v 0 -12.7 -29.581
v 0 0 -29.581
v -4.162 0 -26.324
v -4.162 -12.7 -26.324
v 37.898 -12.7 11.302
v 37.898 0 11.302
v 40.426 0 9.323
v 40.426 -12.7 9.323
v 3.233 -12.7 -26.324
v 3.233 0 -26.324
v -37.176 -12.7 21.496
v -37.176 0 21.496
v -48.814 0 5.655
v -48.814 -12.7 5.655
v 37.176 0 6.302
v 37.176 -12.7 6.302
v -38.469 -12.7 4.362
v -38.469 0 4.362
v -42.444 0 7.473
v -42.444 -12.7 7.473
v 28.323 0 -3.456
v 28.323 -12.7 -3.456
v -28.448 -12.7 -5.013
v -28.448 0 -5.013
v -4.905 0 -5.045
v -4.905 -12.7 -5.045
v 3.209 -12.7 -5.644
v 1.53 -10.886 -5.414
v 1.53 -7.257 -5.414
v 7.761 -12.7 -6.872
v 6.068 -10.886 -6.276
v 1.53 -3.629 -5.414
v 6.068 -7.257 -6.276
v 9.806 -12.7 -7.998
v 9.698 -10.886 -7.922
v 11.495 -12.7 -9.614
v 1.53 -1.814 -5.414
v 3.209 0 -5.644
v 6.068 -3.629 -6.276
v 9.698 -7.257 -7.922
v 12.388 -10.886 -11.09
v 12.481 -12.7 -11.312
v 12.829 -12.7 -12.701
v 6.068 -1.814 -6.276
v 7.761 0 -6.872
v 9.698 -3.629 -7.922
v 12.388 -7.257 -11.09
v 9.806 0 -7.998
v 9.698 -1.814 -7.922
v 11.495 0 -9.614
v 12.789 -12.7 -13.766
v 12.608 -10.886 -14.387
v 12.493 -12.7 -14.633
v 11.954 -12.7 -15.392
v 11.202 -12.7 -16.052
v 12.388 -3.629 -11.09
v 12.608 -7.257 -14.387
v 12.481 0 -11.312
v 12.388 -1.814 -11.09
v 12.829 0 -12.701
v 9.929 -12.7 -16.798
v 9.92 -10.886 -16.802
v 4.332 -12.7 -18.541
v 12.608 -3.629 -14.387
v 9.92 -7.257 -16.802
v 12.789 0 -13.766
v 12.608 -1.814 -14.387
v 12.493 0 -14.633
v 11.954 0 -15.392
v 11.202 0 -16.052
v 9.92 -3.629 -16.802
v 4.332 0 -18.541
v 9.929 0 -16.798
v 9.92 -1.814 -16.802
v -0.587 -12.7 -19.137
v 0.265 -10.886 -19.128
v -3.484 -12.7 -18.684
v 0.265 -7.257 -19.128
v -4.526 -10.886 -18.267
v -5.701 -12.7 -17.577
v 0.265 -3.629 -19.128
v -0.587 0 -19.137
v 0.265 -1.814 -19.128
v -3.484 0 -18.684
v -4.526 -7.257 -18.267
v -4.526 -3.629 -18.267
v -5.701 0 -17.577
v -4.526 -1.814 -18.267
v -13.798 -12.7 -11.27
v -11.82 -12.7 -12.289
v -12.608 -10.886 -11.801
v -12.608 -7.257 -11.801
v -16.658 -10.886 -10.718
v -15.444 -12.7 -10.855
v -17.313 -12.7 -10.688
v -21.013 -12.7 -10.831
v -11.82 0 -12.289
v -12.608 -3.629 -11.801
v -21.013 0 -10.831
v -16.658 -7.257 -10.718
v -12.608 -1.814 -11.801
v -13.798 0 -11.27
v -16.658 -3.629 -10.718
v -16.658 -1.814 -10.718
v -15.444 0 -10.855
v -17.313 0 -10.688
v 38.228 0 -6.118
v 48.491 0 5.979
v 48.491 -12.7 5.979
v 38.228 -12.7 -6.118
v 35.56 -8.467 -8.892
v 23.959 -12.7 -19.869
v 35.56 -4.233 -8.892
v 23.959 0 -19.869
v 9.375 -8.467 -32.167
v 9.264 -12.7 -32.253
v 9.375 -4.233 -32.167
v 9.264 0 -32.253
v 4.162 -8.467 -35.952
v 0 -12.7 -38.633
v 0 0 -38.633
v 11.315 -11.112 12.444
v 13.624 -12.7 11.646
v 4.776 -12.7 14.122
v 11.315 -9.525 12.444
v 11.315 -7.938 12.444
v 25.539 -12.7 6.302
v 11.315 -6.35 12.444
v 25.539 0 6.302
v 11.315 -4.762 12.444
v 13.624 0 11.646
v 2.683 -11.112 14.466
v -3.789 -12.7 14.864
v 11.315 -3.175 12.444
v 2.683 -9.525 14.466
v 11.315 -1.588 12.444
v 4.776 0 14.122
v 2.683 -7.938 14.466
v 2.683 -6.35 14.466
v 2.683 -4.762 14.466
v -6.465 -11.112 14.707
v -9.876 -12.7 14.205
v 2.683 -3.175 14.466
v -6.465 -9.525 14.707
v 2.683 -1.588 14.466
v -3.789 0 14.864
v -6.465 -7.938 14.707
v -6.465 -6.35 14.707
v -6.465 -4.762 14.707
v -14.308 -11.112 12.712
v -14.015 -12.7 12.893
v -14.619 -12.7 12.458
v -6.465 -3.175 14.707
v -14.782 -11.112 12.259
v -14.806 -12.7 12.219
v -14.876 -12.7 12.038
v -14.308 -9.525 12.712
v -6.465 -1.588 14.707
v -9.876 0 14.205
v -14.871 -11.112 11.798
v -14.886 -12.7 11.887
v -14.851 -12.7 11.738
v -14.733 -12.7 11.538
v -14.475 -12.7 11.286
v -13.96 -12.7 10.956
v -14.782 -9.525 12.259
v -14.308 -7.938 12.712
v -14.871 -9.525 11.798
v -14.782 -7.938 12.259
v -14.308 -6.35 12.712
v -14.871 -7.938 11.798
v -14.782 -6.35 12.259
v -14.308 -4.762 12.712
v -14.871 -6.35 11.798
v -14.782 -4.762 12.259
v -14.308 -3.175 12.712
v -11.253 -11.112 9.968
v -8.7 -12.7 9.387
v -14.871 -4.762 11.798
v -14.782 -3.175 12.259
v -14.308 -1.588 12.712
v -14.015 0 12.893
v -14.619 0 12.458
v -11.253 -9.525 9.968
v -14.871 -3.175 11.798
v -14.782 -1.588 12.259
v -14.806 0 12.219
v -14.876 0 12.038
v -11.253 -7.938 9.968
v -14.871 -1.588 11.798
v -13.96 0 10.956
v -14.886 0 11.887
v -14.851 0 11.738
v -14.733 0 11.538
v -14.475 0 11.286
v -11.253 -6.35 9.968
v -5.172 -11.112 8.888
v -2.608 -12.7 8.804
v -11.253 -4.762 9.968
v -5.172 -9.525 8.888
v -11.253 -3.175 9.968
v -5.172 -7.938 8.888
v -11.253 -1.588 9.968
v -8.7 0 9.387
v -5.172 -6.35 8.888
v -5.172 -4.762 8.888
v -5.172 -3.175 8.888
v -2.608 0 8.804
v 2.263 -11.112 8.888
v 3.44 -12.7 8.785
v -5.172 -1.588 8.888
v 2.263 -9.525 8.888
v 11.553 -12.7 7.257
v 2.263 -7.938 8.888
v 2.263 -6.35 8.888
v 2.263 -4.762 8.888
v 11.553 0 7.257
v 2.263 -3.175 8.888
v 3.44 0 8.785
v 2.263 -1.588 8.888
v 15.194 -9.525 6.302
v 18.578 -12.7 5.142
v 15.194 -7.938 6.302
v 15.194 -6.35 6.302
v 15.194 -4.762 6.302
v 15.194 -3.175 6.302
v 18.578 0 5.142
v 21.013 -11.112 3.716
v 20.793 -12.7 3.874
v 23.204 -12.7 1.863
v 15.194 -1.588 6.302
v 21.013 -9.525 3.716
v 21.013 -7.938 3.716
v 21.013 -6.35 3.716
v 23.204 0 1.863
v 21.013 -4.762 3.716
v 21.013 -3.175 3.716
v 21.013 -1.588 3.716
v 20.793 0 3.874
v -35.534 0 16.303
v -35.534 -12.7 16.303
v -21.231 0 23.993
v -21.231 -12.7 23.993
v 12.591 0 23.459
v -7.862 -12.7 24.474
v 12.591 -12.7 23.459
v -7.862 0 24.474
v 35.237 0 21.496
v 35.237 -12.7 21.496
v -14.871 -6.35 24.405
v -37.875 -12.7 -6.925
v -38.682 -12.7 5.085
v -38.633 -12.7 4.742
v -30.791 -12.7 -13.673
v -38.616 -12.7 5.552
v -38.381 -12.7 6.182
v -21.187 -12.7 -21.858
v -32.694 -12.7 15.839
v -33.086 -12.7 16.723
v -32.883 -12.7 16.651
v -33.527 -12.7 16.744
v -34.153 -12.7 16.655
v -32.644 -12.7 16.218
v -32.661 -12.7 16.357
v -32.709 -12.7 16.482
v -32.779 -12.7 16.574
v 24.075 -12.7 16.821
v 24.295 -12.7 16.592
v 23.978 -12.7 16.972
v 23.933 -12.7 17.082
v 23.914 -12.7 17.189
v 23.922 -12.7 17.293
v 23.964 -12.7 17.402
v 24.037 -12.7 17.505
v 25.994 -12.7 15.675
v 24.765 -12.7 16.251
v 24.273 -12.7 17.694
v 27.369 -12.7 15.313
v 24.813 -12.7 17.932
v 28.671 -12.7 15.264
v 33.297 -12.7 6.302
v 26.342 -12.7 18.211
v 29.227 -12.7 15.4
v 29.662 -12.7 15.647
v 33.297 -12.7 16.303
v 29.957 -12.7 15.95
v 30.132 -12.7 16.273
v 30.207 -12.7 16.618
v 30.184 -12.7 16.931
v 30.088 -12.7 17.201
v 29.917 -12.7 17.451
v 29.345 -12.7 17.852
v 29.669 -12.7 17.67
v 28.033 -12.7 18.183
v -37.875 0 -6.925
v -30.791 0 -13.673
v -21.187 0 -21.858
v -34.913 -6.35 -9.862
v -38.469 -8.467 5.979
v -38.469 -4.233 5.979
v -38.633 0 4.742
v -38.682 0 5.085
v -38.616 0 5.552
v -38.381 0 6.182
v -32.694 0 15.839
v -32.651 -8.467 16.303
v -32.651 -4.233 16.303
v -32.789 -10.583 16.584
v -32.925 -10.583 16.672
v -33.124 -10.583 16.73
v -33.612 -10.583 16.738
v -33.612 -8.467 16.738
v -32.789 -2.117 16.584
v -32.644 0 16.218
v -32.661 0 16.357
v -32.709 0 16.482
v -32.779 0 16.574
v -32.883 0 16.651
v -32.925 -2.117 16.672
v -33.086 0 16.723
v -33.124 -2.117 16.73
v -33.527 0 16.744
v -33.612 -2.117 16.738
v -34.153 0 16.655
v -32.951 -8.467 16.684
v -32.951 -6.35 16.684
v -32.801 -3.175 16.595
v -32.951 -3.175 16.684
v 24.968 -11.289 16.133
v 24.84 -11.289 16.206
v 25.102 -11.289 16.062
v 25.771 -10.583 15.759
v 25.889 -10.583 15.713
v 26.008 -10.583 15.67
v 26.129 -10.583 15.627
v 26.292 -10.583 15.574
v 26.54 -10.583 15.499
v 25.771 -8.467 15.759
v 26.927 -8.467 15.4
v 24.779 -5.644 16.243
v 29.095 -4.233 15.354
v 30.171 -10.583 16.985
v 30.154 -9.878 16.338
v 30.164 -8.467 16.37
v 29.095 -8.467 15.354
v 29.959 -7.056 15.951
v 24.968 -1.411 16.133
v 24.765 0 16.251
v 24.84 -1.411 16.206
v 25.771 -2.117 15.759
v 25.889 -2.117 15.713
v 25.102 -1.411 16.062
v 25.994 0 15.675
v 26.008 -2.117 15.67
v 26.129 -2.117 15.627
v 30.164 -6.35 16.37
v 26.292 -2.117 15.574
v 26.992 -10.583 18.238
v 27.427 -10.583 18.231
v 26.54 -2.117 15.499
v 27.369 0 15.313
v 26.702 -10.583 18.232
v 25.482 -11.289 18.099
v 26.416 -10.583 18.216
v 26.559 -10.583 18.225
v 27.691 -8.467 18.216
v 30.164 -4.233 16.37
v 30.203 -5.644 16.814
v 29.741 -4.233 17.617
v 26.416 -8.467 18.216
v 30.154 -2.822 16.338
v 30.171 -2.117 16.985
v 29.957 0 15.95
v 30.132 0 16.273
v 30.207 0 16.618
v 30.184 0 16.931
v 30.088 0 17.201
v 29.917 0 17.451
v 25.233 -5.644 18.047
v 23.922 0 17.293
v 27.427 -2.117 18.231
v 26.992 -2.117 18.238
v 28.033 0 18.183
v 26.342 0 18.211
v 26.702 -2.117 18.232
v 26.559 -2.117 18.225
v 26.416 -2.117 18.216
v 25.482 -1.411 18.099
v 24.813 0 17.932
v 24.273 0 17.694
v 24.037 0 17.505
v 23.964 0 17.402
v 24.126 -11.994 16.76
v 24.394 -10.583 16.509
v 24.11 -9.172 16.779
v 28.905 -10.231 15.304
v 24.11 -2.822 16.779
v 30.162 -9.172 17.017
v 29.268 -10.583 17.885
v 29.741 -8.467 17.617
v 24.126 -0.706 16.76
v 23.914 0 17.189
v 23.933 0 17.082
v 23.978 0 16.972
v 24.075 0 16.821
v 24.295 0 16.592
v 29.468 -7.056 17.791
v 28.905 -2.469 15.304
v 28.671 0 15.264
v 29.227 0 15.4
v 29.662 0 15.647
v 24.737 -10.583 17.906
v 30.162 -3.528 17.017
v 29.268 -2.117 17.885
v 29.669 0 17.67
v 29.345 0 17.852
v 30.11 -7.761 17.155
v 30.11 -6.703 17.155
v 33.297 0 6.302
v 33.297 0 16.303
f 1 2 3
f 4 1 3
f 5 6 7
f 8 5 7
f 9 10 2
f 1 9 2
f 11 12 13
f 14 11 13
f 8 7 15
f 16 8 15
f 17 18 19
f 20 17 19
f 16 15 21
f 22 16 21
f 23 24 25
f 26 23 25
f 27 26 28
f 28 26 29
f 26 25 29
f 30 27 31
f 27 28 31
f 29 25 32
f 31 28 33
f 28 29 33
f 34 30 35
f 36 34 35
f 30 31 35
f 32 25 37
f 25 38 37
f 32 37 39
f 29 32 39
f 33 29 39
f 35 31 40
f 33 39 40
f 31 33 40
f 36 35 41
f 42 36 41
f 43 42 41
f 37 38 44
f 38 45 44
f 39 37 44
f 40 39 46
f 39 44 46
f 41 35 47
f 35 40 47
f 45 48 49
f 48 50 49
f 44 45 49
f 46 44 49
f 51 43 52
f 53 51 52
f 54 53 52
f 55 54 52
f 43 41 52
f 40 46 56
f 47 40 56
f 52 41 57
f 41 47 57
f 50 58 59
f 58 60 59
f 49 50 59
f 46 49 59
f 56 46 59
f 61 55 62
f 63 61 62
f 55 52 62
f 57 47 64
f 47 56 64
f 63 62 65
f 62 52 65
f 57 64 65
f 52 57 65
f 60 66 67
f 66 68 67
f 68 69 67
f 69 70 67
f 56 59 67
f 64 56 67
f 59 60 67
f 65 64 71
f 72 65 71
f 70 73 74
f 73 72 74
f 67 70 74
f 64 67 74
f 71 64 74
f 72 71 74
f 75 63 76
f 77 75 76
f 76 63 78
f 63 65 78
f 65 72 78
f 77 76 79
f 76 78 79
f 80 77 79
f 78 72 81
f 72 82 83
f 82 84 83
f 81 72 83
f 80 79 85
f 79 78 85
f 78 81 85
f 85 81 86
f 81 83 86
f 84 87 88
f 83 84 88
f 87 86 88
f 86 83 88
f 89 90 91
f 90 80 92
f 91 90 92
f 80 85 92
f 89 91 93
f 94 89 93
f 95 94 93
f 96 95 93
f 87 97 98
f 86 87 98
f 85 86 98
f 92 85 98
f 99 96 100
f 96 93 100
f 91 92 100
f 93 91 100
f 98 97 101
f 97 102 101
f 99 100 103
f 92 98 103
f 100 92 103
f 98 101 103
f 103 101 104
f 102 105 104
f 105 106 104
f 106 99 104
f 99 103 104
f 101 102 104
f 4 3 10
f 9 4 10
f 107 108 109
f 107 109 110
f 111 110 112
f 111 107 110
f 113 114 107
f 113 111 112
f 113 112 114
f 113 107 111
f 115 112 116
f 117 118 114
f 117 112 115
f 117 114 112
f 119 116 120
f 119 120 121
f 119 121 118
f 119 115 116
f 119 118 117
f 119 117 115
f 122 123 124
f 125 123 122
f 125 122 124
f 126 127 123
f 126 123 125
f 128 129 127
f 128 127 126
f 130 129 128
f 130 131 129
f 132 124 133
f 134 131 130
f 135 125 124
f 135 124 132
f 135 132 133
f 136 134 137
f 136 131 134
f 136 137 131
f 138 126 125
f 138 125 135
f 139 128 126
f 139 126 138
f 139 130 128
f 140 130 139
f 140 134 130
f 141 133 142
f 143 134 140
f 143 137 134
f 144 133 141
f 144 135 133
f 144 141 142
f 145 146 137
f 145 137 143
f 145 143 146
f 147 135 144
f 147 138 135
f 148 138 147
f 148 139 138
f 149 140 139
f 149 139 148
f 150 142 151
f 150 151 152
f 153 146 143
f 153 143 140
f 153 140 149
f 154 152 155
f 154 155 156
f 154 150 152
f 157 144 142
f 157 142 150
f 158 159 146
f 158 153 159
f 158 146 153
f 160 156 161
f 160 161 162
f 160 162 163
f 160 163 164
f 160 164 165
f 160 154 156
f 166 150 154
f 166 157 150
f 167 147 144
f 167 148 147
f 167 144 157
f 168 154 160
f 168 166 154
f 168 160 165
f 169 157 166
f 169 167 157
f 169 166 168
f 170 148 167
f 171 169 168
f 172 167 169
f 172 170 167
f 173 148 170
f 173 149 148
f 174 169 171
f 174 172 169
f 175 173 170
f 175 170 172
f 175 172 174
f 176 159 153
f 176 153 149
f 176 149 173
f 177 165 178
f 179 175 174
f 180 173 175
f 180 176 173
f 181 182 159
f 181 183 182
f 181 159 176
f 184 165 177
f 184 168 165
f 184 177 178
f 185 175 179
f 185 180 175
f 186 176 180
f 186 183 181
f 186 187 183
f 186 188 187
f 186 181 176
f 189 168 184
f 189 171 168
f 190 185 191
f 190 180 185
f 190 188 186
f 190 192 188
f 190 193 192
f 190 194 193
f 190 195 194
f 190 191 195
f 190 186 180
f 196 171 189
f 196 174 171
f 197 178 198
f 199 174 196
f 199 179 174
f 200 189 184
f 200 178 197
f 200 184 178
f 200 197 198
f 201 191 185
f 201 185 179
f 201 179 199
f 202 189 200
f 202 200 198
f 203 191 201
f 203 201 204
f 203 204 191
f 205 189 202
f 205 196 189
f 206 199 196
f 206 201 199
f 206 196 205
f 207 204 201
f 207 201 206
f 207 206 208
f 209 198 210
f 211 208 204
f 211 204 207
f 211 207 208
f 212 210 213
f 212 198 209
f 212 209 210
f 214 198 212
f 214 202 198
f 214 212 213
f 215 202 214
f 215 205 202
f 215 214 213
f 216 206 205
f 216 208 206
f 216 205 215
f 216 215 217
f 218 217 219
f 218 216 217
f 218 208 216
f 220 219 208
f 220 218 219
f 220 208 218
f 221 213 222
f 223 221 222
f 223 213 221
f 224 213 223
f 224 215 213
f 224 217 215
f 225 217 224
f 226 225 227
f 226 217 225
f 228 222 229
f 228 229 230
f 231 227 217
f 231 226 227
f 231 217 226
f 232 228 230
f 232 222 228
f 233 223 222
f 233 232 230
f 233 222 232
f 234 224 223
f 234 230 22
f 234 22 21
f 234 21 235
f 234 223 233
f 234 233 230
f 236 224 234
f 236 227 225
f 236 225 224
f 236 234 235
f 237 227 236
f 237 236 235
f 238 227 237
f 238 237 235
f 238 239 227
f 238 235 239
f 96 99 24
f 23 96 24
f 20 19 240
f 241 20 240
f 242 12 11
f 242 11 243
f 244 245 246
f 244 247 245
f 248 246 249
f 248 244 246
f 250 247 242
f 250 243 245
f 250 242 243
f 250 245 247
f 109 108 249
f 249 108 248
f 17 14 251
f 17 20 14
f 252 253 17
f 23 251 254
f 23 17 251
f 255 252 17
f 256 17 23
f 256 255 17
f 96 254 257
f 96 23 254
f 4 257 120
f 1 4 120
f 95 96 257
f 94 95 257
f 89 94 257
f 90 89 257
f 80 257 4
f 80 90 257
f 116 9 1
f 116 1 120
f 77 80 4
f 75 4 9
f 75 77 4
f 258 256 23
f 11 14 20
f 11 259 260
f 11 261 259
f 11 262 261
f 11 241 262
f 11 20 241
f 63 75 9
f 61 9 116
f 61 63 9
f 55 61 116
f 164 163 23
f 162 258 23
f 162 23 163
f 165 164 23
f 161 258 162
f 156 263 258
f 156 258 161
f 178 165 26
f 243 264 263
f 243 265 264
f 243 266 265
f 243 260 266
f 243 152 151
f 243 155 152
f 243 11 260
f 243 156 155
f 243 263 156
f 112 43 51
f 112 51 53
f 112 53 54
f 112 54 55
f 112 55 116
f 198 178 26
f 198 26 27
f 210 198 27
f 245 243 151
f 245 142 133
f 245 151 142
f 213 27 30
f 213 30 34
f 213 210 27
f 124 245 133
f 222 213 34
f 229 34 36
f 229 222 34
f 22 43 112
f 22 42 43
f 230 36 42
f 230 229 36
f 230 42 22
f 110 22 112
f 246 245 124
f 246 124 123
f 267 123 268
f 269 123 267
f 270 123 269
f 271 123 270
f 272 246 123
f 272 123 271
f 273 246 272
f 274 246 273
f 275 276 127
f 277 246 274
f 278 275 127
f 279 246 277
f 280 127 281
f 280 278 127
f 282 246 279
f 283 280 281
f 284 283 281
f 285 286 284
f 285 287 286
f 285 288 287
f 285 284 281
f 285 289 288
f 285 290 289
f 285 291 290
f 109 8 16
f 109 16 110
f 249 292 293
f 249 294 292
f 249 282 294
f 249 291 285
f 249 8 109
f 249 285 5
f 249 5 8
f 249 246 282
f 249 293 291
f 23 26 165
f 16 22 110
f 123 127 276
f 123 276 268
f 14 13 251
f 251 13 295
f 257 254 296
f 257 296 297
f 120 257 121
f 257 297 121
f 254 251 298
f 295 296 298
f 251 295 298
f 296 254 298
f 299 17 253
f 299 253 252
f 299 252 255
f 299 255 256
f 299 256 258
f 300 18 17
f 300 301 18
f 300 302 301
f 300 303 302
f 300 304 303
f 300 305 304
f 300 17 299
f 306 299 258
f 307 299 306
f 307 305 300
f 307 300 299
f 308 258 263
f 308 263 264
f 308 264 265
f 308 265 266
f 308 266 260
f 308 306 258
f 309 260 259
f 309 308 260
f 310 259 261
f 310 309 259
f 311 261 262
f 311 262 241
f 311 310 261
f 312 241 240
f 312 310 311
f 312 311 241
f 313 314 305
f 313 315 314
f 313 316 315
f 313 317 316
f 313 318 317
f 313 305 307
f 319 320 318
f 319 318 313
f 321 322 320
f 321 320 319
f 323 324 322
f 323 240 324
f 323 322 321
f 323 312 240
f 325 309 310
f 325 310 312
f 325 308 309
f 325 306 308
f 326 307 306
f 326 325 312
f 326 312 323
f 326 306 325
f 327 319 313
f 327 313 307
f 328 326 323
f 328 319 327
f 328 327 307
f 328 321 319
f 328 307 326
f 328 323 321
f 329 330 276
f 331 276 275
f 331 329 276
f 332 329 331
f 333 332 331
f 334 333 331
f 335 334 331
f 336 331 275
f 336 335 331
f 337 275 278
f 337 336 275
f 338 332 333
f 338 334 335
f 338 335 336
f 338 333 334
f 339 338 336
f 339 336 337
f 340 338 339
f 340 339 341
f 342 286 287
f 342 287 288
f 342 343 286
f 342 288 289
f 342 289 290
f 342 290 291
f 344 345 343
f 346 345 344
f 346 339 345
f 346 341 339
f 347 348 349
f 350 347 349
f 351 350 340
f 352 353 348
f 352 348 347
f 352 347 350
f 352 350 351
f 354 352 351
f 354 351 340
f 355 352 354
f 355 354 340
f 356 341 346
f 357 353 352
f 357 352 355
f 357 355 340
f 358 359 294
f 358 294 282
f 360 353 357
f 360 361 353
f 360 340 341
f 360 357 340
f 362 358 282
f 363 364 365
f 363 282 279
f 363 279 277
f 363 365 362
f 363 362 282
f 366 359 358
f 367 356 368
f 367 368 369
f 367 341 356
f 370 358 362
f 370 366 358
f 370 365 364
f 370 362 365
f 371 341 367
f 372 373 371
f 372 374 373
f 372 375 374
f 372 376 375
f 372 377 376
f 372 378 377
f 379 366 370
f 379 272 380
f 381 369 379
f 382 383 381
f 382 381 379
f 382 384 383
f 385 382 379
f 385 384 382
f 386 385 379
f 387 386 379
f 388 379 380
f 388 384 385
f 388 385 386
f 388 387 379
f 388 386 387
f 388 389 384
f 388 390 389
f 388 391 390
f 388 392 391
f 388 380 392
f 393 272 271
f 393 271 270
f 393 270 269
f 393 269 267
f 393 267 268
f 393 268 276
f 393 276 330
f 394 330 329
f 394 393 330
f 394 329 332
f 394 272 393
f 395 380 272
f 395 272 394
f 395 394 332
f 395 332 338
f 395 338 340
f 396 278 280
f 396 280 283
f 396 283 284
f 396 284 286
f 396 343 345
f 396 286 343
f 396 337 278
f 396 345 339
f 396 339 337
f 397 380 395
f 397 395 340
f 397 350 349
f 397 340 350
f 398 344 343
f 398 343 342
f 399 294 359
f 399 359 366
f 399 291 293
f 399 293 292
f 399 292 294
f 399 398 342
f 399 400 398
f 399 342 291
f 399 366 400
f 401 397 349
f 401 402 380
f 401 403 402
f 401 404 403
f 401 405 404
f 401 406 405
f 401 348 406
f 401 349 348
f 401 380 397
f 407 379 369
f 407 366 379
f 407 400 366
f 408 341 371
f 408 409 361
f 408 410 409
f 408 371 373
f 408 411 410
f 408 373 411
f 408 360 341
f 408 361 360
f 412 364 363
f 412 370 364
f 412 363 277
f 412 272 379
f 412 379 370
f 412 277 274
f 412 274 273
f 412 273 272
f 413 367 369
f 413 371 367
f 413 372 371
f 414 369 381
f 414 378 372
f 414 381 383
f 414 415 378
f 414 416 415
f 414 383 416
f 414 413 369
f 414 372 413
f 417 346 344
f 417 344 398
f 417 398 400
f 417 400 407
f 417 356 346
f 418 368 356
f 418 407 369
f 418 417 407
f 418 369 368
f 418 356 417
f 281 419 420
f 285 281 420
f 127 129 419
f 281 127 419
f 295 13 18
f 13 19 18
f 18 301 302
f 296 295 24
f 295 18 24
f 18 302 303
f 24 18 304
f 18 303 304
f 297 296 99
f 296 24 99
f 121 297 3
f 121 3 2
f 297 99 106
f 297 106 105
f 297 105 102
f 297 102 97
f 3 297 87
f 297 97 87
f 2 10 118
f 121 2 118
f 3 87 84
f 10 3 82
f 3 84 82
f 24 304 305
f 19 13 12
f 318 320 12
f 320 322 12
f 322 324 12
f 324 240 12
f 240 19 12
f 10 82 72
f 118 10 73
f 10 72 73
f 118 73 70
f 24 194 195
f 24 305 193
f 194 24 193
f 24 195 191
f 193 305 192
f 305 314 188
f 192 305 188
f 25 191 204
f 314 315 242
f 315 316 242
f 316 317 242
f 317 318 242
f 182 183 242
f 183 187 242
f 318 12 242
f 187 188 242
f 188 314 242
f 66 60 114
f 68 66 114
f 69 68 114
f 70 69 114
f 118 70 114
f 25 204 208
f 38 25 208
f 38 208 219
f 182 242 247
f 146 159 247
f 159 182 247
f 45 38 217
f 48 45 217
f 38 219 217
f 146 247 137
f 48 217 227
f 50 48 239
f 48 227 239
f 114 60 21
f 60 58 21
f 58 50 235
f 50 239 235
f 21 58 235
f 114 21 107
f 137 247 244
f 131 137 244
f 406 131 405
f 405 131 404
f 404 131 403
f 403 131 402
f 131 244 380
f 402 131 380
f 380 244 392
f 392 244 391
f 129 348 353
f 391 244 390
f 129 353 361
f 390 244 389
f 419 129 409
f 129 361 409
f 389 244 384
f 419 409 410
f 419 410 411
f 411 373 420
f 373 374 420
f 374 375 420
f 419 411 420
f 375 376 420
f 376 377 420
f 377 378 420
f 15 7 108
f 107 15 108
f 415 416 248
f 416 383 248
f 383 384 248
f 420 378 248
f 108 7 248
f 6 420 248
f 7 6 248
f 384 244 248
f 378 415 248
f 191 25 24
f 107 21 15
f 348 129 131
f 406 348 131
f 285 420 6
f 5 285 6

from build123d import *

# Parameters (mm, degrees)
F1_DEPTH = 12.7


with BuildPart() as f1:
    # F0 (on Front) → F1 (new body)
    with BuildSketch(Plane.XZ):
        with BuildLine():
            Line((48.4909079969, 5.9787081555), (35.236723721, 21.4958004653))
            add(Edge.make_bspline(
                [(-37.1763631701, 21.4958004653), (-30.4922389815, 22.790245679), (-13.8237696739, 26.0182557675), (16.8582932137, 23.1899462992), (35.236723721, 21.4958004653)],
                knots=[0, 0, 0, 0, 0.4010040793, 1, 1, 1, 1], degree=3))
            Line((-37.1763631701, 21.4958004653), (-48.8141812384, 5.6554353796))
            add(Edge.make_bspline(
                [(-48.8141812384, 5.6554353796), (-44.8403164381, 0.7530456089), (-35.0104188161, -11.3736854126), (-13.0704494977, -28.4562281329), (0, -38.6329293251)],
                knots=[0, 0, 0, 0, 0.4042630913, 1, 1, 1, 1], degree=3))
            add(Edge.make_bspline(
                [(48.4909079969, 5.9787081555), (44.8904951878, 1.4490455574), (36.4894704691, -9.1202445411), (9.978774935, -32.3836513029), (2.6581978512, -36.9682142154), (0, -38.6329293251)],
                knots=[0, 0, 0, 0, 0.3232538828, 0.7542645813, 1, 1, 1, 1], degree=3))
        make_face()
        Polygon((3.2327261288, -26.3239309324), (0, -29.5812916011), (-4.1621838152, -26.3239309324), align=None, mode=Mode.SUBTRACT)
        with BuildLine():
            add(Edge.make_bspline(
                [(-28.4480005503, -5.0125648268), (-22.1091164505, -5.0009936703), (-9.6048651103, -4.9781680994), (10.2672546047, -5.1245428498), (14.6723723069, -15.4623298937), (5.1981909958, -18.6434819903), (-5.2335699235, -20.2499613433), (-11.8916631255, -10.1838847718), (-18.0761399204, -10.6229779296), (-21.0127271712, -10.8314733952)],
                knots=[0, 0, 0, 0, 0.1884815871, 0.3718037908, 0.4848198852, 0.6056274056, 0.7399920061, 0.8765398941, 1, 1, 1, 1], degree=3))
            Line((-21.0127271712, -10.8314733952), (-28.4480005503, -5.0125648268))
        make_face(mode=Mode.SUBTRACT)
        with BuildLine():
            add(Edge.make_bspline(
                [(-38.4694561362, 4.3623442762), (-38.6533794555, 4.7232636941), (-39.3353238969, 6.0614680713), (-29.9450358126, 17.8599300389), (-34.1461460535, 16.6895645432), (-35.5338509463, 16.3029710401)],
                knots=[0, 0, 0, 0, 0.1982803923, 0.735177094, 1, 1, 1, 1], degree=3))
            Line((-38.4694561362, 4.3623442762), (-42.4442321206, 7.4730379728))
            Line((-42.4442321206, 7.4730379728), (-35.5338509463, 16.3029710401))
        make_face(mode=Mode.SUBTRACT)
        with BuildLine():
            Line((33.2970917225, 6.3019809313), (33.2970917225, 16.3029710401))
            Line((33.2970917225, 16.3029710401), (37.8975473915, 11.3024759857))
            Line((37.8975473915, 11.3024759857), (40.4264117575, 9.323365094))
            Line((40.4264117575, 9.323365094), (37.1763631701, 6.3019809313))
            Line((37.1763631701, 6.3019809313), (28.3229519033, -3.4561581429))
            add(Edge.make_bspline(
                [(25.5385432392, 6.3019809313), (20.9778197005, 8.5478855169), (11.5117521271, 13.2094012588), (-4.5961265742, 16.0705158031), (-19.8744258084, 11.6866465044), (-3.9120833051, 8.1031682244), (1.6488071751, 9.6499650339), (15.4946900706, 6.4180829782), (21.2232439982, 4.2673584975), (25.7769204491, -0.686422181), (28.3229519033, -3.4561581429)],
                knots=[0, 0, 0, 0, 0.1490080045, 0.3092754533, 0.422175284, 0.542633541, 0.6458581709, 0.7833280946, 0.8788553617, 1, 1, 1, 1], degree=3))
            Line((25.5385432392, 6.3019809313), (33.2970917225, 6.3019809313))
        make_face(mode=Mode.SUBTRACT)
        with BuildLine():
            add(Edge.make_bspline(
                [(23.9221826196, 17.2932539135), (23.709703424, 16.3345558525), (29.7102568431, 13.8088770407), (31.1284897834, 18.9057951608), (24.1404262468, 18.2779608715), (23.9221826196, 17.2932539135)],
                knots=[0, 0, 0, 0, 0.3731560578, 0.6167204447, 1, 1, 1, 1], degree=3))
        make_face(mode=Mode.SUBTRACT)
    extrude(amount=F1_DEPTH)


solid = f1.part
